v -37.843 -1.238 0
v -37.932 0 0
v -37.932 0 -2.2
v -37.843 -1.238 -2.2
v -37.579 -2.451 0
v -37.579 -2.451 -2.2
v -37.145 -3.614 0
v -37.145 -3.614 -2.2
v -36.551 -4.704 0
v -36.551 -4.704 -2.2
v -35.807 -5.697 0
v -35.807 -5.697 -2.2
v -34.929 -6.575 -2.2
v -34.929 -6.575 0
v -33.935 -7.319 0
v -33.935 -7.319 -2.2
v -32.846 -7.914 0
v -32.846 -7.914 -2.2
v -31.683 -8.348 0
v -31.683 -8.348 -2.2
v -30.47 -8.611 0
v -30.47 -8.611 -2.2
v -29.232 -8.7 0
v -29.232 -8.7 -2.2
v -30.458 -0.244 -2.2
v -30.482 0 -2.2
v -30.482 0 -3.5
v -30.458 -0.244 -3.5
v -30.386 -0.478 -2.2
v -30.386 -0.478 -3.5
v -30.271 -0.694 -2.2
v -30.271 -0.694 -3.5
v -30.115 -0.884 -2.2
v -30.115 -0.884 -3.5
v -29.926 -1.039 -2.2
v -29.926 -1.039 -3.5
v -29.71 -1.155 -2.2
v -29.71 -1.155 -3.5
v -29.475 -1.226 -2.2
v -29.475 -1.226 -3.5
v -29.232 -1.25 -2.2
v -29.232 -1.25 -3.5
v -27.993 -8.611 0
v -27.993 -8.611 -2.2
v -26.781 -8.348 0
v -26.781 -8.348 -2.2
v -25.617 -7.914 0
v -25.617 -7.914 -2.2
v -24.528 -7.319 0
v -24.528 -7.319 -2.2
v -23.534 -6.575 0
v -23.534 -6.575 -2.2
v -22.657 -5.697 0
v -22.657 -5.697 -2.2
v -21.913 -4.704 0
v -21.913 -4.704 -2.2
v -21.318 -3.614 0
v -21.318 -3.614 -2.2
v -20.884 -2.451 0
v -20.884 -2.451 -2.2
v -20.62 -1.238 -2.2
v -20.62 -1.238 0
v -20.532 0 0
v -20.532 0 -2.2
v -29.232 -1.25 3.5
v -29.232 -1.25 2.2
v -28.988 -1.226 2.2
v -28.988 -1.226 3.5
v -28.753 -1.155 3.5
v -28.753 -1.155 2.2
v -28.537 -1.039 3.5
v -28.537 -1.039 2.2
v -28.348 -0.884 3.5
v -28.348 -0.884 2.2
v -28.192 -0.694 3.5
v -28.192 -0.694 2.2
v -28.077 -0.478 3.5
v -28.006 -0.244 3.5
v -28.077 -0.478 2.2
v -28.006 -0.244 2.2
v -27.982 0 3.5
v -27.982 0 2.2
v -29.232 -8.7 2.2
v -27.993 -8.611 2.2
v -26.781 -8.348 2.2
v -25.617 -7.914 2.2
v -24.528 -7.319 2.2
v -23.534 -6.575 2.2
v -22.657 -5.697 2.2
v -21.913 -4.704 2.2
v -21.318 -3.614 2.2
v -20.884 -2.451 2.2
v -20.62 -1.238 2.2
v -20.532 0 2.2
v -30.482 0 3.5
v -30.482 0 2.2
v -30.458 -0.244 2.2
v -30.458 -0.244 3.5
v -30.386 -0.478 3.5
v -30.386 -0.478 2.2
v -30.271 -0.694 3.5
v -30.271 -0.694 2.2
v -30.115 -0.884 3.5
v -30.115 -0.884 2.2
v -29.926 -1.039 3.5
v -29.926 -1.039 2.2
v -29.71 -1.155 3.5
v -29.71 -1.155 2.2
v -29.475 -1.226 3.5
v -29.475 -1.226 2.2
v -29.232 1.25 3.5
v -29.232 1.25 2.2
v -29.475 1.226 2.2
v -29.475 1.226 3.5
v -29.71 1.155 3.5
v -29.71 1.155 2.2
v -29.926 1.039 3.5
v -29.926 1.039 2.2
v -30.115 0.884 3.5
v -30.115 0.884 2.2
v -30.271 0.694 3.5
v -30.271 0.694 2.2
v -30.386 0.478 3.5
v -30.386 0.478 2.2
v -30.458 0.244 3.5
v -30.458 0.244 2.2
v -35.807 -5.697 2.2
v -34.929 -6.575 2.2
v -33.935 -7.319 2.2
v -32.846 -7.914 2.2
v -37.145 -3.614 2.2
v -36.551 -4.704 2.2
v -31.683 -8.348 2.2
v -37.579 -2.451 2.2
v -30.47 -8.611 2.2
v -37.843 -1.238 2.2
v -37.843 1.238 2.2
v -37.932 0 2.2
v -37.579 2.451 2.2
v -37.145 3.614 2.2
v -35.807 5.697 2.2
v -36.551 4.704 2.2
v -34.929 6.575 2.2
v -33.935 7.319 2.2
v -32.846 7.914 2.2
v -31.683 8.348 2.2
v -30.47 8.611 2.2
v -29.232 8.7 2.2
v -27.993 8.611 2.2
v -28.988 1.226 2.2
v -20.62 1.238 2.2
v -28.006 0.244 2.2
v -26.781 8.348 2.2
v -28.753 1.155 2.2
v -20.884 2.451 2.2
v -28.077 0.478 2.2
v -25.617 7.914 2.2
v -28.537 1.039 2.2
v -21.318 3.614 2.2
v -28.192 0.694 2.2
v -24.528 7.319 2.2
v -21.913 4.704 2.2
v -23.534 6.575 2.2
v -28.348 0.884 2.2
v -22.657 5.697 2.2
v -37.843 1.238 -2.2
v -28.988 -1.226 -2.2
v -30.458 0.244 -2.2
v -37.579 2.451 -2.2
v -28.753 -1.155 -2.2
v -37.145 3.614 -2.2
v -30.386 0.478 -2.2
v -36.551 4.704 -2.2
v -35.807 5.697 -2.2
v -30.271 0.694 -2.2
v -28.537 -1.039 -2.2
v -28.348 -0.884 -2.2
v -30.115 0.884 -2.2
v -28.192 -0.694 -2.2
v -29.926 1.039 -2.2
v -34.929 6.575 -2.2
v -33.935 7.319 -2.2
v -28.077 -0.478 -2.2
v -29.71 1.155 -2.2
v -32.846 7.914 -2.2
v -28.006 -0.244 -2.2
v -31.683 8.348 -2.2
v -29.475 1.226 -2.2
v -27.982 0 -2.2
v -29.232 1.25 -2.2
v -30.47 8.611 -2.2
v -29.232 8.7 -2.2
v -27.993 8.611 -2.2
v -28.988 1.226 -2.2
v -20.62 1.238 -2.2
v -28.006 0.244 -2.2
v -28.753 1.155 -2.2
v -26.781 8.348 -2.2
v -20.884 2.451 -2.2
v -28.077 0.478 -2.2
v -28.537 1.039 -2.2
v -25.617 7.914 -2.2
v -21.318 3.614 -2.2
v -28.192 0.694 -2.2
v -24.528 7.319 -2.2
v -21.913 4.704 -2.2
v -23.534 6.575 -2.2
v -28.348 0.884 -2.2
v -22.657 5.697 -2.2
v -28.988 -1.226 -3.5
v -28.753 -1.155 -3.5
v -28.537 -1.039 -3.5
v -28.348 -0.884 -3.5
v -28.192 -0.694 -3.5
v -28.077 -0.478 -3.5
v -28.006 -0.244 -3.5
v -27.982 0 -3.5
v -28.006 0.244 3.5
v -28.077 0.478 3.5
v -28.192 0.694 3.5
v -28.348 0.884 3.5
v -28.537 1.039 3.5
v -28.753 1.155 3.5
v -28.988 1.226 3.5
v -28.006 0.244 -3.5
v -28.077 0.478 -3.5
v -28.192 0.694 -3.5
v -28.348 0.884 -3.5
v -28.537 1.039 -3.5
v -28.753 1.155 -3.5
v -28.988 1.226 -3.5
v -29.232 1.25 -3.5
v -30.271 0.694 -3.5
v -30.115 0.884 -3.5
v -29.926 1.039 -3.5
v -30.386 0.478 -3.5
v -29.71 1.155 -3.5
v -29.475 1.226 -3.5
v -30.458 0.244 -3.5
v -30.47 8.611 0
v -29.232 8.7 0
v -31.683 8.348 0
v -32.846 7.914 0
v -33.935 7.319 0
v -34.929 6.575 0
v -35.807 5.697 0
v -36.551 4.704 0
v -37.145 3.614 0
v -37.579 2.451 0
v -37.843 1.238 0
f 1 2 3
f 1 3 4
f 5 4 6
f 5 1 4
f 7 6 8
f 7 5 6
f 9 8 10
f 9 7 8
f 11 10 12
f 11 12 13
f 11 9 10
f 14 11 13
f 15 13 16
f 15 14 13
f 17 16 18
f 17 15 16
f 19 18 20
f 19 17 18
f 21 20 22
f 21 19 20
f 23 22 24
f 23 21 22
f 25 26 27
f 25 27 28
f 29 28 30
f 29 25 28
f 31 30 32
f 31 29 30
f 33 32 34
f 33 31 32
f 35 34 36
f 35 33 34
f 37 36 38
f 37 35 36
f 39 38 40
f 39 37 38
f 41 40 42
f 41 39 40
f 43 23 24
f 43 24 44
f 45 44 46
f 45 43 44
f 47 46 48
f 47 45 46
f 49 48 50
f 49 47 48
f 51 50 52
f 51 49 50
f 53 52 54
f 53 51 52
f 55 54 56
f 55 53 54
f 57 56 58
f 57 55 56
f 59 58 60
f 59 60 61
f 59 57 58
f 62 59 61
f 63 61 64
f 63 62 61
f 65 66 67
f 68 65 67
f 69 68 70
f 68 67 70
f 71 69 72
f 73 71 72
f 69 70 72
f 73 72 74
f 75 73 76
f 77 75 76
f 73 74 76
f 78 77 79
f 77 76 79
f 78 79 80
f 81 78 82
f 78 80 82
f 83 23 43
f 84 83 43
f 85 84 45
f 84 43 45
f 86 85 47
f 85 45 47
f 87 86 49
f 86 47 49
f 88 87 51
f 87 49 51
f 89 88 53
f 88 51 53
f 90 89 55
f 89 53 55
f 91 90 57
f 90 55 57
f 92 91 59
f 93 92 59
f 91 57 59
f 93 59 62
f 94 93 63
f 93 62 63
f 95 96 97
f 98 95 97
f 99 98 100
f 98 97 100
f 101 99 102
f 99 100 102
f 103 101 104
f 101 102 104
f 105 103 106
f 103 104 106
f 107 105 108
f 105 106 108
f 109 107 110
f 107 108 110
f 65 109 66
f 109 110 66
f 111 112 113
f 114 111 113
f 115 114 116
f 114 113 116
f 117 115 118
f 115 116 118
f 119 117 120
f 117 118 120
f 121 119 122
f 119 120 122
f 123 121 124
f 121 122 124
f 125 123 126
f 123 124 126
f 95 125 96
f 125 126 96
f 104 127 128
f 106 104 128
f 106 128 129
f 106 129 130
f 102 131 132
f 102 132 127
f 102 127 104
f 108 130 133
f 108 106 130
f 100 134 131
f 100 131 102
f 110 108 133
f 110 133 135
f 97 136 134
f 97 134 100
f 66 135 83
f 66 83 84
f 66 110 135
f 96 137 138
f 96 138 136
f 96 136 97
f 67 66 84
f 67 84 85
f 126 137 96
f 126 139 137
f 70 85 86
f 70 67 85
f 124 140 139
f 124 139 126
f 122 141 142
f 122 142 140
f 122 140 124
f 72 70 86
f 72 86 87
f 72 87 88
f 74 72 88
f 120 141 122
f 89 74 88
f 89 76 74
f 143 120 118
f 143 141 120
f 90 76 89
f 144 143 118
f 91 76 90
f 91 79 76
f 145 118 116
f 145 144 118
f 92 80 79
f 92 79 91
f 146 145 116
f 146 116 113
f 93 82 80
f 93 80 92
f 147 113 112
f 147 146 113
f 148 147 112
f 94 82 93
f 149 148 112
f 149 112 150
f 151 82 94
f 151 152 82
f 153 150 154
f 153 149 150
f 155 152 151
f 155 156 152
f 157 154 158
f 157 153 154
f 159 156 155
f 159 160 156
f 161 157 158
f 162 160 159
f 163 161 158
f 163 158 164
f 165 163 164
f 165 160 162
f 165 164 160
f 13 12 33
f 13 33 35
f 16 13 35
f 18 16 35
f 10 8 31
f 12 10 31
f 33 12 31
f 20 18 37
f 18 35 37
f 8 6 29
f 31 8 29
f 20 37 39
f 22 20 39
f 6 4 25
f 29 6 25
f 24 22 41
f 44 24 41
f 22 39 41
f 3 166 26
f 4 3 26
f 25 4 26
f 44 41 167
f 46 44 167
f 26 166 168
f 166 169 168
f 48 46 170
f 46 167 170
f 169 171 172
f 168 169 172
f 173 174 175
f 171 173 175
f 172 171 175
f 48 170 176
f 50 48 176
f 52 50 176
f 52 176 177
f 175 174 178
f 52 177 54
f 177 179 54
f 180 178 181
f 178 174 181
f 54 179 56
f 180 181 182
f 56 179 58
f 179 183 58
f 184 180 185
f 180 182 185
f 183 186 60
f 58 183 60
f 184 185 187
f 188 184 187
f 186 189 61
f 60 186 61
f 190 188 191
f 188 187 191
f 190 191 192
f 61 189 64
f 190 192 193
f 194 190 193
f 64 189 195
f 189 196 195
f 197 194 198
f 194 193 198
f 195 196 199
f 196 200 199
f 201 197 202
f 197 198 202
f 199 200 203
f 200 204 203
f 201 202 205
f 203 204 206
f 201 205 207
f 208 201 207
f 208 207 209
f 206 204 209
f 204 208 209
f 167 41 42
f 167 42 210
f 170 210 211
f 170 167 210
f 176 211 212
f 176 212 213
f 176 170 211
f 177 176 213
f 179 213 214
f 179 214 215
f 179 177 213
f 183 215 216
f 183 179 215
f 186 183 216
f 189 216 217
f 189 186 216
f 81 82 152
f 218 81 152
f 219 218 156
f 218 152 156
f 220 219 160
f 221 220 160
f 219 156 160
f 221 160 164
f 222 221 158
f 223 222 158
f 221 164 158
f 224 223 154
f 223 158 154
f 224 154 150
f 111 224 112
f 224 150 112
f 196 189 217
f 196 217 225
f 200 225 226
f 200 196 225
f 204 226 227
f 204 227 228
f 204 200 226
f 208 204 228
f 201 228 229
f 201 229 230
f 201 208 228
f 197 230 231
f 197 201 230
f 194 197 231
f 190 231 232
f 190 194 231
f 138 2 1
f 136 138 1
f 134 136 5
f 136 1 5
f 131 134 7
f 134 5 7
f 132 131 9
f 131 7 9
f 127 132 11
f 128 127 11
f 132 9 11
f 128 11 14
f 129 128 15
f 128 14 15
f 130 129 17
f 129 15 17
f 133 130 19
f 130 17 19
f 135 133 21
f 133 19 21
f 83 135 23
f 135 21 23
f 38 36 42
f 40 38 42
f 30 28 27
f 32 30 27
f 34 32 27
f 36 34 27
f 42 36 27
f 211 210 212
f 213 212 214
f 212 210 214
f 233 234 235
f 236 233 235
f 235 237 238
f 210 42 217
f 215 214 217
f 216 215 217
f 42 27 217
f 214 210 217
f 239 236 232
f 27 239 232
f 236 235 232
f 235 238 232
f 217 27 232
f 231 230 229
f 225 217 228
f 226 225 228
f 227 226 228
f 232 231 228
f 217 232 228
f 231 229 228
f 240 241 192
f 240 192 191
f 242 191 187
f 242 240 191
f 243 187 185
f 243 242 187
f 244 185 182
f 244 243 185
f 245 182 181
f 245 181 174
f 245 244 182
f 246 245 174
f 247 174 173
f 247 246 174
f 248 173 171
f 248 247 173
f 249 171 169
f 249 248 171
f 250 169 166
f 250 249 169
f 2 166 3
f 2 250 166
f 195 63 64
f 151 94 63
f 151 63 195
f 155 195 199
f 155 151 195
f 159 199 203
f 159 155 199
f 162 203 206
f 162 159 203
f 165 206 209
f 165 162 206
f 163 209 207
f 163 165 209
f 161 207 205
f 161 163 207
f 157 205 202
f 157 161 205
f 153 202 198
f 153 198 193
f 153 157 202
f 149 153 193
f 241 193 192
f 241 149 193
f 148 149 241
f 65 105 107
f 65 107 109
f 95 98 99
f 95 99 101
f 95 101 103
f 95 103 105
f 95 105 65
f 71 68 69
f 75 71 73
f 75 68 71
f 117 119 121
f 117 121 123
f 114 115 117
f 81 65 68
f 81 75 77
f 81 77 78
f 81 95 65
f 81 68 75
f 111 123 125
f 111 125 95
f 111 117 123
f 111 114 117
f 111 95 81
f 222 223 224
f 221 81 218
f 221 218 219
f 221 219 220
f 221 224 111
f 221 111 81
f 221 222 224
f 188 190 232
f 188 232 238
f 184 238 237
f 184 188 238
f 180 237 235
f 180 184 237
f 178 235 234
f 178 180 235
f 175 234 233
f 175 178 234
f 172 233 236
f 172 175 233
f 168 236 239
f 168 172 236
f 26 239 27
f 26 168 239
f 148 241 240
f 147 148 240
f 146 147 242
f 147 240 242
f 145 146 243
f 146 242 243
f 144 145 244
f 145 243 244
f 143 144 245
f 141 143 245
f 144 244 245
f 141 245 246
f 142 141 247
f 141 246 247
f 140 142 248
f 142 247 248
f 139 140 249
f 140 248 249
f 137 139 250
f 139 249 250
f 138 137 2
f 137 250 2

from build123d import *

# Parameters (mm, degrees)
F1_DEPTH = 2.2
F2_DEPTH = 3.5


with BuildPart() as f1:
    # F0 (on Top) → F1 (new body, symmetric)
    with BuildSketch(Plane.XY):
        with BuildLine():
            Line((-27.9816011338, 0), (-20.5316011338, 0))
            ThreePointArc((-20.5316011338, 0), (-23.0797721375, 6.1518289963), (-29.2316011338, 8.7))
            Line((-29.2316011338, 8.7), (-29.2316011338, 1.25))
            ThreePointArc((-29.2316011338, 1.25), (-28.3477176573, 0.8838834765), (-27.9816011338, 0))
        make_face()
        with BuildLine():
            Line((-29.2316011338, 1.25), (-29.2316011338, 8.7))
            ThreePointArc((-29.2316011338, 8.7), (-35.3834301302, 6.1518289963), (-37.9316011338, 0))
            Line((-37.9316011338, 0), (-30.4816011338, 0))
            ThreePointArc((-30.4816011338, 0), (-30.1154846103, 0.8838834765), (-29.2316011338, 1.25))
        make_face()
        with BuildLine():
            ThreePointArc((-37.9316011338, 0), (-35.3834301302, -6.1518289963), (-29.2316011338, -8.7))
            Line((-29.2316011338, -8.7), (-29.2316011338, -1.25))
            ThreePointArc((-29.2316011338, -1.25), (-30.1154846103, -0.8838834765), (-30.4816011338, 0))
            Line((-30.4816011338, 0), (-37.9316011338, 0))
        make_face()
        with BuildLine():
            ThreePointArc((-29.2316011338, -8.7), (-23.0797721375, -6.1518289963), (-20.5316011338, 0))
            Line((-20.5316011338, 0), (-27.9816011338, 0))
            ThreePointArc((-27.9816011338, 0), (-28.3477176573, -0.8838834765), (-29.2316011338, -1.25))
            Line((-29.2316011338, -1.25), (-29.2316011338, -8.7))
        make_face()
    extrude(amount=F1_DEPTH, both=True)

    # F0 (on Top) → F2 (join, symmetric)
    with BuildSketch(Plane.XY):
        with BuildLine():
            ThreePointArc((-29.2316011338, -1.25), (-28.3477176573, -0.8838834765), (-27.9816011338, 0))
            Line((-27.9816011338, 0), (-29.2316011338, 0))
            Line((-29.2316011338, 0), (-29.2316011338, -1.25))
        make_face()
        with BuildLine():
            Line((-29.2316011338, 0), (-27.9816011338, 0))
            ThreePointArc((-27.9816011338, 0), (-28.3477176573, 0.8838834765), (-29.2316011338, 1.25))
            Line((-29.2316011338, 1.25), (-29.2316011338, 0))
        make_face()
        with BuildLine():
            Line((-29.2316011338, 0), (-29.2316011338, 1.25))
            ThreePointArc((-29.2316011338, 1.25), (-30.1154846103, 0.8838834765), (-30.4816011338, 0))
            Line((-30.4816011338, 0), (-29.2316011338, 0))
        make_face()
        with BuildLine():
            ThreePointArc((-30.4816011338, 0), (-30.1154846103, -0.8838834765), (-29.2316011338, -1.25))
            Line((-29.2316011338, -1.25), (-29.2316011338, 0))
            Line((-29.2316011338, 0), (-30.4816011338, 0))
        make_face()
    extrude(amount=F2_DEPTH, both=True)


solid = f1.part
